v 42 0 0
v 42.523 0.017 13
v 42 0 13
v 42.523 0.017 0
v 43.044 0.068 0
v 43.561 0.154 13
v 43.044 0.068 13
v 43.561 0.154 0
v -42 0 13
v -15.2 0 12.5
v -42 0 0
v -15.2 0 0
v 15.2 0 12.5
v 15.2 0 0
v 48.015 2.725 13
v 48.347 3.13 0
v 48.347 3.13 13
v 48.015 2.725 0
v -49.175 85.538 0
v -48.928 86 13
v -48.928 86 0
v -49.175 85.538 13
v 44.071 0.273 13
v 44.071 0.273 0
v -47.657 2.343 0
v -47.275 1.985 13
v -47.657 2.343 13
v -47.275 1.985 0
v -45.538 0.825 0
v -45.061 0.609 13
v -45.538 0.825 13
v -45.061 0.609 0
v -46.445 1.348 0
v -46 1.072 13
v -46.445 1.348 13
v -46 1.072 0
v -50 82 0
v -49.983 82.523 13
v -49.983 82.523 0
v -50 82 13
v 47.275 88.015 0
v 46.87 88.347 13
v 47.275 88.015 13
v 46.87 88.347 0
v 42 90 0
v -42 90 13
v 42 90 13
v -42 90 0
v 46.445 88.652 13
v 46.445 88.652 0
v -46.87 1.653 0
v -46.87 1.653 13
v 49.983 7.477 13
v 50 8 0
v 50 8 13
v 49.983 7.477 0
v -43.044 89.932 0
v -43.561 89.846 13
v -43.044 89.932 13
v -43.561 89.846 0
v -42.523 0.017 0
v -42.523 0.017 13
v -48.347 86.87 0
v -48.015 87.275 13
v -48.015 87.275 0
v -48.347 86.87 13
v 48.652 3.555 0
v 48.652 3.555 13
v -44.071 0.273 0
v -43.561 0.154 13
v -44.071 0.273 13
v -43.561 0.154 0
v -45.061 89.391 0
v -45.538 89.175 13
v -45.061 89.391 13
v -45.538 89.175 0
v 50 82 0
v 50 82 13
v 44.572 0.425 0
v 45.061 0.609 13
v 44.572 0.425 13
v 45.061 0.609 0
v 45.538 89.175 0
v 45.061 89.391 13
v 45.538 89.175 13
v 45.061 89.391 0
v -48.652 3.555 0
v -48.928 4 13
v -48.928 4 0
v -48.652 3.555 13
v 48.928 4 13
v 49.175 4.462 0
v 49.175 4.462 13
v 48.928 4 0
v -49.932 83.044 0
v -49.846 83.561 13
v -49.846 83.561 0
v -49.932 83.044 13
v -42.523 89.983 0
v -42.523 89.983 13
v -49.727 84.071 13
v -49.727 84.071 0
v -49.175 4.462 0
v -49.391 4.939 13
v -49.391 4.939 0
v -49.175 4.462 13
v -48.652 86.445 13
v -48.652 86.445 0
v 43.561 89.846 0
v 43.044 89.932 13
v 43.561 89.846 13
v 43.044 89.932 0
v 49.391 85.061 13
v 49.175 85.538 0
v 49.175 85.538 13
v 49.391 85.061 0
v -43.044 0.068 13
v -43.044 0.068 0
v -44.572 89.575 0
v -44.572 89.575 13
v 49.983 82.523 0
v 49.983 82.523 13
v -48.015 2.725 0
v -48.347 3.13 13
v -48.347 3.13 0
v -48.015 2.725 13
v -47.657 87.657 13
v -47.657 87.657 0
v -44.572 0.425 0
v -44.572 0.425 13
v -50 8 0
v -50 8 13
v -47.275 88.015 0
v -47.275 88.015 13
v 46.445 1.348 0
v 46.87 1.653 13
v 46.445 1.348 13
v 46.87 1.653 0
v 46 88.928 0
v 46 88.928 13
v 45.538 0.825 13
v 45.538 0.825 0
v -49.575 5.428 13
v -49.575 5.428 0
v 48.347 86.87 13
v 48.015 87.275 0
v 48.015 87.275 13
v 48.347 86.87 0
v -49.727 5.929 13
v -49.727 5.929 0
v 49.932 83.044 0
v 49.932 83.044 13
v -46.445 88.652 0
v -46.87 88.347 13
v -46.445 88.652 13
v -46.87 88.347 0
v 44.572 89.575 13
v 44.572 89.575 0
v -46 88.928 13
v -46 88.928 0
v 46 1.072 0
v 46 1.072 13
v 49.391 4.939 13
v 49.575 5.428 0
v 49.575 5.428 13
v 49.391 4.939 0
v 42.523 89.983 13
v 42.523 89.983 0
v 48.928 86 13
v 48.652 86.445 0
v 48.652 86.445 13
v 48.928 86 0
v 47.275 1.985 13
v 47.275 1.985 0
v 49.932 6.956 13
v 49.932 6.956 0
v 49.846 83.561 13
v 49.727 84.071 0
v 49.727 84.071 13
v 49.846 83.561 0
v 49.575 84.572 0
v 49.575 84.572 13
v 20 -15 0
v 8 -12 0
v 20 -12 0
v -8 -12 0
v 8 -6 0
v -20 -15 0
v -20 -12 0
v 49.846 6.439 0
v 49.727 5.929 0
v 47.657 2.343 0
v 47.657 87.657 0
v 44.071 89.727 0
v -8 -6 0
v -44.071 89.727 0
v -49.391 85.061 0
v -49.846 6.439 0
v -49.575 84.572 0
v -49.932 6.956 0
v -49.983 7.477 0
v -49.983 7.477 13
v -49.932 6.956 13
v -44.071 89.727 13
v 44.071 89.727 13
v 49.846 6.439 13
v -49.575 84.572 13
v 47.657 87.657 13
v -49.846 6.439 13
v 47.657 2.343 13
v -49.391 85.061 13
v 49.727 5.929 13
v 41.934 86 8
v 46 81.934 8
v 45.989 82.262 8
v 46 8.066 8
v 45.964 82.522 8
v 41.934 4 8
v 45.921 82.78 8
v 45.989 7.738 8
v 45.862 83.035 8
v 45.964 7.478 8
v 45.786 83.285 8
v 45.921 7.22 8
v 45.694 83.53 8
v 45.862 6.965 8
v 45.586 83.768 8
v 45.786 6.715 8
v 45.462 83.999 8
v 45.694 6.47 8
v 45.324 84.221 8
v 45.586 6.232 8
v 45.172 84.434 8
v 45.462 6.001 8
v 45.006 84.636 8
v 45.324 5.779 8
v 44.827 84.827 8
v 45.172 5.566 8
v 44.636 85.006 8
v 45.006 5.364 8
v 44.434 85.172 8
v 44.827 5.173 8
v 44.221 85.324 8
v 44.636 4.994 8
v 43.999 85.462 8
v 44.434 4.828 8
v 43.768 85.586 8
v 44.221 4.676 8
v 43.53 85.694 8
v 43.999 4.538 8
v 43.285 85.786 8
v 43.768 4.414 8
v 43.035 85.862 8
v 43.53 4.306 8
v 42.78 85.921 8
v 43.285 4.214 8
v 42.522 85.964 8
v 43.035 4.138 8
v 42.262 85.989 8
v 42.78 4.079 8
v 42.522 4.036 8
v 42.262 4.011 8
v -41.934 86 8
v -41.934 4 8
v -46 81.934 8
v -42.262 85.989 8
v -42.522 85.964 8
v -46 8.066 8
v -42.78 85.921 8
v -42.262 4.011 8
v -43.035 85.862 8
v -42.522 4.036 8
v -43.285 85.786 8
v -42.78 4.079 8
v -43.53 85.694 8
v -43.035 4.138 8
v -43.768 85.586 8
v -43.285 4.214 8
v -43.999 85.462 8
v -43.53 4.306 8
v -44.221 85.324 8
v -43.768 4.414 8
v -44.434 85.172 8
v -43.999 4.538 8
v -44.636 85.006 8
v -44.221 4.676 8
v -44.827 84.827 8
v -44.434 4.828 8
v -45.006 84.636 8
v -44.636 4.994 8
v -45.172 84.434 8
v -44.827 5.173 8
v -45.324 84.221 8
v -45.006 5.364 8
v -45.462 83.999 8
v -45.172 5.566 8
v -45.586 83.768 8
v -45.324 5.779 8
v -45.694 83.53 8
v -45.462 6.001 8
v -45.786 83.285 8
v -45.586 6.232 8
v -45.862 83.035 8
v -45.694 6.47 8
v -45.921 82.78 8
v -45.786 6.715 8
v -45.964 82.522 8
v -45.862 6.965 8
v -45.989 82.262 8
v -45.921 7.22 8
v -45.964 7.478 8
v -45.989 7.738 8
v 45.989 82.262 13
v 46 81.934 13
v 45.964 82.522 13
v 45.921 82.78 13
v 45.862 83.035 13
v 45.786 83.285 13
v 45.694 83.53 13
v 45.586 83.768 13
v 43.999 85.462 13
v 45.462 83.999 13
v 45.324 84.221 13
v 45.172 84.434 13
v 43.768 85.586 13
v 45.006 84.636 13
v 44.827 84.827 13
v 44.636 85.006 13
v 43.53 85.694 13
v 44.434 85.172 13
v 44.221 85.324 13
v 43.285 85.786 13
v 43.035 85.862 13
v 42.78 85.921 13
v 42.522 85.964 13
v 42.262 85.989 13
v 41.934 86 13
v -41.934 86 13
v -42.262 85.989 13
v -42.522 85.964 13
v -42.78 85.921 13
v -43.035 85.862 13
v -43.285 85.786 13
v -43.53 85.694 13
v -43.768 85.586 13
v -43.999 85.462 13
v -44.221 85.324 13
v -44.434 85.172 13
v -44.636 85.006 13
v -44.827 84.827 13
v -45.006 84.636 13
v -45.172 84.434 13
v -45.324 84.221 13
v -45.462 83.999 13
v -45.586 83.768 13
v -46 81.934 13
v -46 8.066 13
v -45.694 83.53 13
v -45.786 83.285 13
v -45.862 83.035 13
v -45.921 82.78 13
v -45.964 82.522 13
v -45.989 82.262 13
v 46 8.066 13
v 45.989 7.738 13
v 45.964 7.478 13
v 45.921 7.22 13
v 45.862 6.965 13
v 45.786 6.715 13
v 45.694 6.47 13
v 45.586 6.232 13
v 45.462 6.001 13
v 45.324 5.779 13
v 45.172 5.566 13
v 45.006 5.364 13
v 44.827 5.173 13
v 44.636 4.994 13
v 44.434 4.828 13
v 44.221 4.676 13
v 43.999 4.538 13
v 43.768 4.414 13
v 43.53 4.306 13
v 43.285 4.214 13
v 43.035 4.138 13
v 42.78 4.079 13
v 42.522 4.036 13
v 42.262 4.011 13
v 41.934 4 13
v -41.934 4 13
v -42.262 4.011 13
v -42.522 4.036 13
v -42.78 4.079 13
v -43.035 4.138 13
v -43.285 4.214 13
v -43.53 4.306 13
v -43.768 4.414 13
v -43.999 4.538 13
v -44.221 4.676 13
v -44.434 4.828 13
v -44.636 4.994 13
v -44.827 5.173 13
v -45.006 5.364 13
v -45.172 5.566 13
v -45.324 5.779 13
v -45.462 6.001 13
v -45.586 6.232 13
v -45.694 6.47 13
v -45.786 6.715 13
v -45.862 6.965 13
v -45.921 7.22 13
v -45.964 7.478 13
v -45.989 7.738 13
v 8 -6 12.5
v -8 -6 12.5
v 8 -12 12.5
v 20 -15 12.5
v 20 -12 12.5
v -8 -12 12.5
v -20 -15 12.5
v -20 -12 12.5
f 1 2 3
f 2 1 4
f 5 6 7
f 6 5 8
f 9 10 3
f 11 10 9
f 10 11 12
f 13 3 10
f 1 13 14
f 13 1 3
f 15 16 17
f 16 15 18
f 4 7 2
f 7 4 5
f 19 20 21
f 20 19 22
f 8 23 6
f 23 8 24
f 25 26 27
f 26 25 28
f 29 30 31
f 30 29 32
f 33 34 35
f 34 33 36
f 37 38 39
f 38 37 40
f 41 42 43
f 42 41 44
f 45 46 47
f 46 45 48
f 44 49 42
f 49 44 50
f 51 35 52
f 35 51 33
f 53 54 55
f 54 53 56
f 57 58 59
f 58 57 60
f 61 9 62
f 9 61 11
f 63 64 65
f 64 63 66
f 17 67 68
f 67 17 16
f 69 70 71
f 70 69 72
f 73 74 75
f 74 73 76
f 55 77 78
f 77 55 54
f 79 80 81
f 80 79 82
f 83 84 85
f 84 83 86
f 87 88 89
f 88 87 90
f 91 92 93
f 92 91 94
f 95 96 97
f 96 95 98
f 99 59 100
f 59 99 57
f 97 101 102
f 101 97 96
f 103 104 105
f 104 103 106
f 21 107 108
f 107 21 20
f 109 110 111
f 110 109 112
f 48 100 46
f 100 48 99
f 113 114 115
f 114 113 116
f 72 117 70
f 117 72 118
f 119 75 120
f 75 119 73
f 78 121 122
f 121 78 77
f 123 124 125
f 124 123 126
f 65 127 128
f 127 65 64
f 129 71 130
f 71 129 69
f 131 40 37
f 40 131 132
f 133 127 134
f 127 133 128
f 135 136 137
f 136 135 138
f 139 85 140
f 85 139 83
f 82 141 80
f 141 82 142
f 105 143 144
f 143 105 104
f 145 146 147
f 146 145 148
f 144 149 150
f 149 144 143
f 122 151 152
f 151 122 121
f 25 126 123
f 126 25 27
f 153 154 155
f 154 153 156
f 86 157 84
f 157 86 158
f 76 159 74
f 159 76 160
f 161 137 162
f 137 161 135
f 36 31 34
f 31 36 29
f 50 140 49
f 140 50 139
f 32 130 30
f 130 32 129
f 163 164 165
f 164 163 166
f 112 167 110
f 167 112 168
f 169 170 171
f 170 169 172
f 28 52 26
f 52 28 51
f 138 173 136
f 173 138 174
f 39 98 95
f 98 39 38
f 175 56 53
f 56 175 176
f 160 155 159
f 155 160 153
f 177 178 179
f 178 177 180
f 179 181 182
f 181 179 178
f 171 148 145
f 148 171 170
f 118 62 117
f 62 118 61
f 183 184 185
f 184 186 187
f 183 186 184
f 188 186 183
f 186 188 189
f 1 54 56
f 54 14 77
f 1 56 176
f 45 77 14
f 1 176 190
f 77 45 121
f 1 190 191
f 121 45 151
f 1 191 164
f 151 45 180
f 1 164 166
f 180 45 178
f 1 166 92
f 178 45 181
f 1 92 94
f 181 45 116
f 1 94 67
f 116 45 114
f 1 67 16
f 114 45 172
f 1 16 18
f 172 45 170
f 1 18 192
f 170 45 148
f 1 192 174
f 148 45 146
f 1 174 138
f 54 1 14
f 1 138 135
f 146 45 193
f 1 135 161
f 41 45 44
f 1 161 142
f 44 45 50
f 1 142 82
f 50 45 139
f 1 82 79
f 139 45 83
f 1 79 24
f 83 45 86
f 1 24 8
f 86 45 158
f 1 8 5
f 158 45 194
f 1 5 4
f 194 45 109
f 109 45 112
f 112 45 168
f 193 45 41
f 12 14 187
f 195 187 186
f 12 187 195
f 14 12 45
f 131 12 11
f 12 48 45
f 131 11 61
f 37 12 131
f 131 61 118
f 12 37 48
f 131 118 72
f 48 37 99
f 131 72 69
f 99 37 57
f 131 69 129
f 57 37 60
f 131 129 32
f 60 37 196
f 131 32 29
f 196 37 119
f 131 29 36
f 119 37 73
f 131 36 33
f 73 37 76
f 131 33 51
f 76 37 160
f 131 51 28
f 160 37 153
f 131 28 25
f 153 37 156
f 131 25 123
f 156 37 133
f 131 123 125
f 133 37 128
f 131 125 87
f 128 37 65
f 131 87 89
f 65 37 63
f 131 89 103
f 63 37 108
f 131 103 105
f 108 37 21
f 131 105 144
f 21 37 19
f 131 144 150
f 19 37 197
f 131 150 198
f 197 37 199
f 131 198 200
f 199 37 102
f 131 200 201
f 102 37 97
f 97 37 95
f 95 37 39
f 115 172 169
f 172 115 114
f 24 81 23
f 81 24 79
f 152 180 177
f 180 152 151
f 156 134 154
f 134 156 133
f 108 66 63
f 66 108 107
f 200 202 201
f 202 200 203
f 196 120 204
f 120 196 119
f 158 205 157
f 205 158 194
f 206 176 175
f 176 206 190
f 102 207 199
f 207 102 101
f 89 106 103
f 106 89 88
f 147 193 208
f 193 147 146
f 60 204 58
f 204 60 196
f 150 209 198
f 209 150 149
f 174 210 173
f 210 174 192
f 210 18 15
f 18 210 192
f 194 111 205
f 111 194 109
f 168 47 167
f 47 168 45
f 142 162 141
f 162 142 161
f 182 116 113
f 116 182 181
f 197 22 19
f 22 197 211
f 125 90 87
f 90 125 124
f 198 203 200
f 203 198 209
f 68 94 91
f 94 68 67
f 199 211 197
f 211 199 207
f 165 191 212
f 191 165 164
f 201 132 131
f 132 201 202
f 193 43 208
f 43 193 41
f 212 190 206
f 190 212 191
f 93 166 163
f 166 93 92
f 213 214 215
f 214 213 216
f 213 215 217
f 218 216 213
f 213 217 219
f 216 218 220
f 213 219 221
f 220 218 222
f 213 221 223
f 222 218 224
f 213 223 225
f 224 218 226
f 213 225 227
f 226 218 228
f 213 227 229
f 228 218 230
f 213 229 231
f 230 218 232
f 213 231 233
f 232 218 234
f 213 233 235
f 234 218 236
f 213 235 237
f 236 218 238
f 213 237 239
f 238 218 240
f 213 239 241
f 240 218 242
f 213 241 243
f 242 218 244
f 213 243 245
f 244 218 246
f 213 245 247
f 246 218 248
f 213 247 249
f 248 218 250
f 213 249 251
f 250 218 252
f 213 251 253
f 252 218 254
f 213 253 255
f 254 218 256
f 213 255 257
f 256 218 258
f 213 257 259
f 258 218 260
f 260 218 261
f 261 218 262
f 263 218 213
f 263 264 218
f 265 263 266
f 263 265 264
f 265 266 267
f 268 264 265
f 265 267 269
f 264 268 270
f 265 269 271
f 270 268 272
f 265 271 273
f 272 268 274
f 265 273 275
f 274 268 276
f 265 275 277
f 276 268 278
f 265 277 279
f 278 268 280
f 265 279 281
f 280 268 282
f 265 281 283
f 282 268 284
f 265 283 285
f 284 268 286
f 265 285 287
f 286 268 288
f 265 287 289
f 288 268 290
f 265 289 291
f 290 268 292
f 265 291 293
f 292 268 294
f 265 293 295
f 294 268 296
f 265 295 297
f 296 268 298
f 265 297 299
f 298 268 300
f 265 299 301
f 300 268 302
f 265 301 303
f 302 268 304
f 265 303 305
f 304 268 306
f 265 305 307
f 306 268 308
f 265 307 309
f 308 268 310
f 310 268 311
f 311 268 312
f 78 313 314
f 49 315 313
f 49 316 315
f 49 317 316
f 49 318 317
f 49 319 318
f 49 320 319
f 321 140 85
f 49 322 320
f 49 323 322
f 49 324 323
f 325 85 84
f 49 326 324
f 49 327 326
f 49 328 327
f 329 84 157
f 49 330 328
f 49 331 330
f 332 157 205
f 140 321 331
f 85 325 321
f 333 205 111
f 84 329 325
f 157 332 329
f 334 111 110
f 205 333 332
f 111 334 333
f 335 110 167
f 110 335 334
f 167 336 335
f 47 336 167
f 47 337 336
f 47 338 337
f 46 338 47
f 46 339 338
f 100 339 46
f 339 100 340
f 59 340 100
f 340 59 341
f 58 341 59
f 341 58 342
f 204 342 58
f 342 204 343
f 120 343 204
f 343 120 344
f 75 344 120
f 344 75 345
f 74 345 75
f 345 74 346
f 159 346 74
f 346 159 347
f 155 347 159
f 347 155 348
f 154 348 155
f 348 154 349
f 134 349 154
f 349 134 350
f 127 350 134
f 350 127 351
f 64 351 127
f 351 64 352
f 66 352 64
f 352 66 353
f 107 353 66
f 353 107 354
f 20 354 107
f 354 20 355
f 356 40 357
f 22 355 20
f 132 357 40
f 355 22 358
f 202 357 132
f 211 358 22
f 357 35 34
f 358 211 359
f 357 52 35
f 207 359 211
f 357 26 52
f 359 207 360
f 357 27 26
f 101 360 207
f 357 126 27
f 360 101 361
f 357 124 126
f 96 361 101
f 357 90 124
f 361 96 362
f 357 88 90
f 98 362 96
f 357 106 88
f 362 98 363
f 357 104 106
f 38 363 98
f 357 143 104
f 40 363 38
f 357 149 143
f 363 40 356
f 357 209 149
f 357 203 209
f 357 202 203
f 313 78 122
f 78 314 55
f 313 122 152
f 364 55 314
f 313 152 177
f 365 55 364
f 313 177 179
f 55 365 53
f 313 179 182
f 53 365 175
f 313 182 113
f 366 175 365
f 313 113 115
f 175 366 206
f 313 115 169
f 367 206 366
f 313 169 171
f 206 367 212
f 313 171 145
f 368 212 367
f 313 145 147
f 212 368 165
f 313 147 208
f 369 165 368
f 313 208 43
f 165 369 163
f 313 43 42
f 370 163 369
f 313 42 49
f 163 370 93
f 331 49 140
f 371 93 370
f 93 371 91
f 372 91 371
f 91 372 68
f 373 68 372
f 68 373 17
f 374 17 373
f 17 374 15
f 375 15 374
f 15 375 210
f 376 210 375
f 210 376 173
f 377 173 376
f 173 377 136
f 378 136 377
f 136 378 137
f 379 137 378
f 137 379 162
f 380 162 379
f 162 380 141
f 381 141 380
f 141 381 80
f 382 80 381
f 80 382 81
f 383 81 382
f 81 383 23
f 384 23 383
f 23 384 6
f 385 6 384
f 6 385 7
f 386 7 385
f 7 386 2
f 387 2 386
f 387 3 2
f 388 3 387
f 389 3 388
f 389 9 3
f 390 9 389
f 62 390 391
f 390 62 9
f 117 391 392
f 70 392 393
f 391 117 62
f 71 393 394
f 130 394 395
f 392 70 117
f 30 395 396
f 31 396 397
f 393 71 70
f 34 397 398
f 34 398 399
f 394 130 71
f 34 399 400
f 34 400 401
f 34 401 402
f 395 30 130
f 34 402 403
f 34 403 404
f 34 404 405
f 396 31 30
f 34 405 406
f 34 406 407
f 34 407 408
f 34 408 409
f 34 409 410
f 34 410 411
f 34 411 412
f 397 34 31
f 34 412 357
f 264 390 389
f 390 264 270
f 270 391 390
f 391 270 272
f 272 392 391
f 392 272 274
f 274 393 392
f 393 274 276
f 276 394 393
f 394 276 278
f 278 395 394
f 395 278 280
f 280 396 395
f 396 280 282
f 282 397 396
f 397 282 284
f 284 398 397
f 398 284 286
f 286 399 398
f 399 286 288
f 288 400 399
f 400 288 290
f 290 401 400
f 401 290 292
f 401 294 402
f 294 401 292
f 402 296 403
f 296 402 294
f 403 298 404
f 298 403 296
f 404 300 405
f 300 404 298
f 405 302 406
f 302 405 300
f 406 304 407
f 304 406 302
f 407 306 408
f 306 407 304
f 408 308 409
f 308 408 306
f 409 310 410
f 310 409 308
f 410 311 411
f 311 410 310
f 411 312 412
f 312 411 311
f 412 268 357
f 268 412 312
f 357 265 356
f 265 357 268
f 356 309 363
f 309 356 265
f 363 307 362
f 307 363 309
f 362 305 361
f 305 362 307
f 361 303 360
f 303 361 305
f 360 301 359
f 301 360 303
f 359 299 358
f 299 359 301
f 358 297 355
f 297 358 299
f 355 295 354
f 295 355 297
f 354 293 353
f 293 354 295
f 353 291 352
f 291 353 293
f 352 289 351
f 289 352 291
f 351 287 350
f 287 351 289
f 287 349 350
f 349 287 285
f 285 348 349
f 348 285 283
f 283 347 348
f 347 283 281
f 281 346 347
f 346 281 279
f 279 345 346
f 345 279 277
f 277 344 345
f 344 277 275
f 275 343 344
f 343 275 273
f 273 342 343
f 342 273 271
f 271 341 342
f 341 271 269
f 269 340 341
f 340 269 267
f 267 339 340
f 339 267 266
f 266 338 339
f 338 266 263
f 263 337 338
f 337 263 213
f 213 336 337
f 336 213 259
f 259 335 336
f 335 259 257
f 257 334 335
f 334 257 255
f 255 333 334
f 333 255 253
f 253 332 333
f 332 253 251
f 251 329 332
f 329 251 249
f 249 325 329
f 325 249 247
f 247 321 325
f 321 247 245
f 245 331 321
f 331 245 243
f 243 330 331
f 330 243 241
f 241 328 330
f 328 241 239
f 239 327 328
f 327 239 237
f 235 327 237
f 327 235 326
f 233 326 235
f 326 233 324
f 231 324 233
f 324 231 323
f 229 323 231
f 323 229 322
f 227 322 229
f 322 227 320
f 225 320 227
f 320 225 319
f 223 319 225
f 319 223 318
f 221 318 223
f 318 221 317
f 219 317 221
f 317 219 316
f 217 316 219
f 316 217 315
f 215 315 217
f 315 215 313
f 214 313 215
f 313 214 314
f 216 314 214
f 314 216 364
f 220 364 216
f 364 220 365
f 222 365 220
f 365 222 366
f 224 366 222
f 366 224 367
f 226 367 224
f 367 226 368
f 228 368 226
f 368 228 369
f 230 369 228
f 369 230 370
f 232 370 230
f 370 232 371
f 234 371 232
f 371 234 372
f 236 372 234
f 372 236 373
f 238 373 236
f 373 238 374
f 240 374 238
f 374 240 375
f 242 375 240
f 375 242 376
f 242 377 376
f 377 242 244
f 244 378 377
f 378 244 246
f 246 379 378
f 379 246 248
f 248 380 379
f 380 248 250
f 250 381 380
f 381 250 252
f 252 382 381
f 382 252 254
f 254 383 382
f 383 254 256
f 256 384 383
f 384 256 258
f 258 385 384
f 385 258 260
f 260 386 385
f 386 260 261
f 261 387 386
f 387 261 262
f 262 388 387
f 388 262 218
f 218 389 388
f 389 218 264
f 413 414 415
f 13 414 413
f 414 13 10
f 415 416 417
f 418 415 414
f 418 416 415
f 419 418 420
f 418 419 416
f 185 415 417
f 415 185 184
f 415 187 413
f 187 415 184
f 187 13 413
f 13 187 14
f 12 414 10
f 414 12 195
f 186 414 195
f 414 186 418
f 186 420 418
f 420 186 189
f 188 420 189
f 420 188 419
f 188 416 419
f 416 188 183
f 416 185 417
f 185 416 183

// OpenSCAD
// ============================================================
//  ACCESSORI PARAMETRICI PER PANNELLI ACUSTICI A DOGHE
//  Mensola - Vaschetta - Piattino - Portavaso - Innesto di prova
//
//  Derivato dal portavaso "Acoustic_Panel_Plant_Holder_10.5cm".
//
//  COME SI USA (dettagli nel manuale PDF allegato):
//  1. Apri questo file in OpenSCAD
//  2. Finestra > Customizer: scegli il pezzo e modifica le misure
//  3. F5 = anteprima rapida, F6 = rendering completo
//  4. File > Export > Export as STL -> apri in BambuStudio
//
//  Tutte le misure sono in millimetri.
//  I valori di default riproducono il portavaso originale.
// ============================================================

/* [Cosa vuoi stampare?] */

// Tipo di pezzo da generare
tipo_pezzo = "mensola"; // [mensola, vaschetta, piattino, portavaso, solo_innesto]

/* [Pannello e innesto] */

// Spessore della piastrina che entra nella fessura tra le doghe (0,5-1 mm meno della fessura)
spessore_innesto = 12.5; // [6:0.1:20]

// Profondita' delle doghe = lunghezza del collo che attraversa la fessura
profondita_doga = 12.0; // [5:0.5:30]

// Larghezza del collo (passa nella fessura)
larghezza_collo = 16.0; // [8:0.5:40]

// Larghezza della testa a T che si aggancia dietro le doghe
larghezza_testa = 40.0; // [20:0.5:80]

// Spessore (lunghezza) della testa a T dietro le doghe
spessore_testa = 3.0; // [2:0.25:10]

// Lunghezza del raccordo di rinforzo tra collo e corpo del pezzo
raccordo_collo = 6.0; // [0:0.5:15]

// Larghezza della svasatura dove il collo incontra il corpo
larghezza_svasatura = 40.0; // [16:1:80]

/* [Mensola e vaschetta] */

// Larghezza della mensola / vaschetta
larghezza_mensola = 100.0; // [40:1:200]

// Profondita' della mensola / vaschetta (dal muro verso l'esterno)
profondita_mensola = 90.0; // [30:1:200]

// Spessore del piano
spessore_mensola = 8.0; // [3:0.5:20]

// Raggio degli spigoli
raggio_spigoli = 8.0; // [0:0.5:25]

// Altezza del bordino anticaduta della mensola (0 = nessun bordino)
altezza_bordo = 5.0; // [0:0.5:20]

// Altezza delle pareti della vaschetta
altezza_parete = 25.0; // [5:1:60]

// Spessore del bordino / delle pareti
spessore_bordo = 4.0; // [2:0.5:10]

// Bordino sopra il piano? Se dopo il montaggio resta rivolto in giu', metti "no"
bordo_sopra = true; // [true:false]

/* [Piattino rotondo] */

// Diametro esterno del piattino
diametro_piattino = 90.0; // [40:1:200]

/* [Portavaso (anello)] */

// Diametro interno dell'anello = diametro del vaso
diametro_vaso = 105.0; // [40:1:220]

// Larghezza della fascia dell'anello
banda_anello = 5.0; // [3:0.5:12]

/* [Avanzate] */

// Quanto il corpo si sovrappone al collo (zona di unione)
sovrapposizione = 4.0; // [2:0.5:10]

// Risoluzione delle curve (aumenta se gli spigoli sono seghettati)
$fn = 96; // [24:8:200]

// ============================================================
//  DA QUI IN POI NON SERVE MODIFICARE
// ============================================================

module profilo_innesto() {
    // Piano X-Y visto dall'alto. y=0: faccia del pannello
    yt = -(profondita_doga + spessore_testa); // fondo testa
    polygon(points = [
        [-larghezza_testa/2, yt],
        [ larghezza_testa/2, yt],
        [ larghezza_testa/2, -profondita_doga],
        [ larghezza_collo/2, -profondita_doga],
        [ larghezza_collo/2, -raccordo_collo],
        [ larghezza_svasatura/2,  sovrapposizione],
        [-larghezza_svasatura/2,  sovrapposizione],
        [-larghezza_collo/2, -raccordo_collo],
        [-larghezza_collo/2, -profondita_doga],
        [-larghezza_testa/2, -profondita_doga]
    ]);
}

module innesto() {
    linear_extrude(height = spessore_innesto)
        profilo_innesto();
}

// ---- mensola / vaschetta ----

module sagoma_mensola(riduci = 0) {
    offset(delta = -riduci)
        offset(r = raggio_spigoli)
            offset(delta = -raggio_spigoli)
                translate([-larghezza_mensola/2, 0])
                    square([larghezza_mensola, profondita_mensola]);
}

module piano_mensola() {
    linear_extrude(height = spessore_mensola)
        sagoma_mensola();
}

module bordino(h) {
    if (h > 0)
        translate([0, 0, bordo_sopra ? spessore_mensola : -h])
            linear_extrude(height = h)
                difference() {
                    sagoma_mensola();
                    sagoma_mensola(spessore_bordo);
                }
}

// ---- piattino ----

module piattino() {
    r = diametro_piattino / 2;
    yc = r - sovrapposizione; // il bordo posteriore si sovrappone al collo
    linear_extrude(height = spessore_mensola)
        translate([0, yc])
            circle(r = r);
    if (altezza_bordo > 0)
        translate([0, 0, bordo_sopra ? spessore_mensola : -altezza_bordo])
            linear_extrude(height = altezza_bordo)
                difference() {
                    translate([0, yc]) circle(r = r);
                    translate([0, yc]) circle(r = r - spessore_bordo);
                }
}

// ---- portavaso ----

module portavaso() {
    r_out = diametro_vaso/2 + banda_anello;
    linear_extrude(height = spessore_mensola)
        translate([0, r_out - sovrapposizione])
            difference() {
                circle(r = r_out);
                circle(r = diametro_vaso/2);
            }
}

// ---- solo innesto di prova ----

module solo_innesto() {
    // piccola linguetta per maneggiarlo durante la prova di incastro
    translate([0, 0, 0])
        linear_extrude(height = spessore_innesto)
            offset(r = 4)
                translate([-larghezza_svasatura/2, 0])
                    square([larghezza_svasatura, 20]);
}

// ---- assemblaggio ----

module corpo() {
    innesto();
    if (tipo_pezzo == "mensola") {
        piano_mensola();
        bordino(altezza_bordo);
    } else if (tipo_pezzo == "vaschetta") {
        piano_mensola();
        bordino(altezza_parete);
    } else if (tipo_pezzo == "piattino") {
        piattino();
    } else if (tipo_pezzo == "portavaso") {
        portavaso();
    } else if (tipo_pezzo == "solo_innesto") {
        solo_innesto();
    }
}

// se una sporgenza va sotto il piano, rialza tutto per tenerlo sul piatto
h_sotto = (bordo_sopra || (tipo_pezzo == "portavaso") || (tipo_pezzo == "solo_innesto"))
          ? 0
          : (tipo_pezzo == "vaschetta" ? altezza_parete : altezza_bordo);

translate([0, 0, h_sotto])
    corpo();
